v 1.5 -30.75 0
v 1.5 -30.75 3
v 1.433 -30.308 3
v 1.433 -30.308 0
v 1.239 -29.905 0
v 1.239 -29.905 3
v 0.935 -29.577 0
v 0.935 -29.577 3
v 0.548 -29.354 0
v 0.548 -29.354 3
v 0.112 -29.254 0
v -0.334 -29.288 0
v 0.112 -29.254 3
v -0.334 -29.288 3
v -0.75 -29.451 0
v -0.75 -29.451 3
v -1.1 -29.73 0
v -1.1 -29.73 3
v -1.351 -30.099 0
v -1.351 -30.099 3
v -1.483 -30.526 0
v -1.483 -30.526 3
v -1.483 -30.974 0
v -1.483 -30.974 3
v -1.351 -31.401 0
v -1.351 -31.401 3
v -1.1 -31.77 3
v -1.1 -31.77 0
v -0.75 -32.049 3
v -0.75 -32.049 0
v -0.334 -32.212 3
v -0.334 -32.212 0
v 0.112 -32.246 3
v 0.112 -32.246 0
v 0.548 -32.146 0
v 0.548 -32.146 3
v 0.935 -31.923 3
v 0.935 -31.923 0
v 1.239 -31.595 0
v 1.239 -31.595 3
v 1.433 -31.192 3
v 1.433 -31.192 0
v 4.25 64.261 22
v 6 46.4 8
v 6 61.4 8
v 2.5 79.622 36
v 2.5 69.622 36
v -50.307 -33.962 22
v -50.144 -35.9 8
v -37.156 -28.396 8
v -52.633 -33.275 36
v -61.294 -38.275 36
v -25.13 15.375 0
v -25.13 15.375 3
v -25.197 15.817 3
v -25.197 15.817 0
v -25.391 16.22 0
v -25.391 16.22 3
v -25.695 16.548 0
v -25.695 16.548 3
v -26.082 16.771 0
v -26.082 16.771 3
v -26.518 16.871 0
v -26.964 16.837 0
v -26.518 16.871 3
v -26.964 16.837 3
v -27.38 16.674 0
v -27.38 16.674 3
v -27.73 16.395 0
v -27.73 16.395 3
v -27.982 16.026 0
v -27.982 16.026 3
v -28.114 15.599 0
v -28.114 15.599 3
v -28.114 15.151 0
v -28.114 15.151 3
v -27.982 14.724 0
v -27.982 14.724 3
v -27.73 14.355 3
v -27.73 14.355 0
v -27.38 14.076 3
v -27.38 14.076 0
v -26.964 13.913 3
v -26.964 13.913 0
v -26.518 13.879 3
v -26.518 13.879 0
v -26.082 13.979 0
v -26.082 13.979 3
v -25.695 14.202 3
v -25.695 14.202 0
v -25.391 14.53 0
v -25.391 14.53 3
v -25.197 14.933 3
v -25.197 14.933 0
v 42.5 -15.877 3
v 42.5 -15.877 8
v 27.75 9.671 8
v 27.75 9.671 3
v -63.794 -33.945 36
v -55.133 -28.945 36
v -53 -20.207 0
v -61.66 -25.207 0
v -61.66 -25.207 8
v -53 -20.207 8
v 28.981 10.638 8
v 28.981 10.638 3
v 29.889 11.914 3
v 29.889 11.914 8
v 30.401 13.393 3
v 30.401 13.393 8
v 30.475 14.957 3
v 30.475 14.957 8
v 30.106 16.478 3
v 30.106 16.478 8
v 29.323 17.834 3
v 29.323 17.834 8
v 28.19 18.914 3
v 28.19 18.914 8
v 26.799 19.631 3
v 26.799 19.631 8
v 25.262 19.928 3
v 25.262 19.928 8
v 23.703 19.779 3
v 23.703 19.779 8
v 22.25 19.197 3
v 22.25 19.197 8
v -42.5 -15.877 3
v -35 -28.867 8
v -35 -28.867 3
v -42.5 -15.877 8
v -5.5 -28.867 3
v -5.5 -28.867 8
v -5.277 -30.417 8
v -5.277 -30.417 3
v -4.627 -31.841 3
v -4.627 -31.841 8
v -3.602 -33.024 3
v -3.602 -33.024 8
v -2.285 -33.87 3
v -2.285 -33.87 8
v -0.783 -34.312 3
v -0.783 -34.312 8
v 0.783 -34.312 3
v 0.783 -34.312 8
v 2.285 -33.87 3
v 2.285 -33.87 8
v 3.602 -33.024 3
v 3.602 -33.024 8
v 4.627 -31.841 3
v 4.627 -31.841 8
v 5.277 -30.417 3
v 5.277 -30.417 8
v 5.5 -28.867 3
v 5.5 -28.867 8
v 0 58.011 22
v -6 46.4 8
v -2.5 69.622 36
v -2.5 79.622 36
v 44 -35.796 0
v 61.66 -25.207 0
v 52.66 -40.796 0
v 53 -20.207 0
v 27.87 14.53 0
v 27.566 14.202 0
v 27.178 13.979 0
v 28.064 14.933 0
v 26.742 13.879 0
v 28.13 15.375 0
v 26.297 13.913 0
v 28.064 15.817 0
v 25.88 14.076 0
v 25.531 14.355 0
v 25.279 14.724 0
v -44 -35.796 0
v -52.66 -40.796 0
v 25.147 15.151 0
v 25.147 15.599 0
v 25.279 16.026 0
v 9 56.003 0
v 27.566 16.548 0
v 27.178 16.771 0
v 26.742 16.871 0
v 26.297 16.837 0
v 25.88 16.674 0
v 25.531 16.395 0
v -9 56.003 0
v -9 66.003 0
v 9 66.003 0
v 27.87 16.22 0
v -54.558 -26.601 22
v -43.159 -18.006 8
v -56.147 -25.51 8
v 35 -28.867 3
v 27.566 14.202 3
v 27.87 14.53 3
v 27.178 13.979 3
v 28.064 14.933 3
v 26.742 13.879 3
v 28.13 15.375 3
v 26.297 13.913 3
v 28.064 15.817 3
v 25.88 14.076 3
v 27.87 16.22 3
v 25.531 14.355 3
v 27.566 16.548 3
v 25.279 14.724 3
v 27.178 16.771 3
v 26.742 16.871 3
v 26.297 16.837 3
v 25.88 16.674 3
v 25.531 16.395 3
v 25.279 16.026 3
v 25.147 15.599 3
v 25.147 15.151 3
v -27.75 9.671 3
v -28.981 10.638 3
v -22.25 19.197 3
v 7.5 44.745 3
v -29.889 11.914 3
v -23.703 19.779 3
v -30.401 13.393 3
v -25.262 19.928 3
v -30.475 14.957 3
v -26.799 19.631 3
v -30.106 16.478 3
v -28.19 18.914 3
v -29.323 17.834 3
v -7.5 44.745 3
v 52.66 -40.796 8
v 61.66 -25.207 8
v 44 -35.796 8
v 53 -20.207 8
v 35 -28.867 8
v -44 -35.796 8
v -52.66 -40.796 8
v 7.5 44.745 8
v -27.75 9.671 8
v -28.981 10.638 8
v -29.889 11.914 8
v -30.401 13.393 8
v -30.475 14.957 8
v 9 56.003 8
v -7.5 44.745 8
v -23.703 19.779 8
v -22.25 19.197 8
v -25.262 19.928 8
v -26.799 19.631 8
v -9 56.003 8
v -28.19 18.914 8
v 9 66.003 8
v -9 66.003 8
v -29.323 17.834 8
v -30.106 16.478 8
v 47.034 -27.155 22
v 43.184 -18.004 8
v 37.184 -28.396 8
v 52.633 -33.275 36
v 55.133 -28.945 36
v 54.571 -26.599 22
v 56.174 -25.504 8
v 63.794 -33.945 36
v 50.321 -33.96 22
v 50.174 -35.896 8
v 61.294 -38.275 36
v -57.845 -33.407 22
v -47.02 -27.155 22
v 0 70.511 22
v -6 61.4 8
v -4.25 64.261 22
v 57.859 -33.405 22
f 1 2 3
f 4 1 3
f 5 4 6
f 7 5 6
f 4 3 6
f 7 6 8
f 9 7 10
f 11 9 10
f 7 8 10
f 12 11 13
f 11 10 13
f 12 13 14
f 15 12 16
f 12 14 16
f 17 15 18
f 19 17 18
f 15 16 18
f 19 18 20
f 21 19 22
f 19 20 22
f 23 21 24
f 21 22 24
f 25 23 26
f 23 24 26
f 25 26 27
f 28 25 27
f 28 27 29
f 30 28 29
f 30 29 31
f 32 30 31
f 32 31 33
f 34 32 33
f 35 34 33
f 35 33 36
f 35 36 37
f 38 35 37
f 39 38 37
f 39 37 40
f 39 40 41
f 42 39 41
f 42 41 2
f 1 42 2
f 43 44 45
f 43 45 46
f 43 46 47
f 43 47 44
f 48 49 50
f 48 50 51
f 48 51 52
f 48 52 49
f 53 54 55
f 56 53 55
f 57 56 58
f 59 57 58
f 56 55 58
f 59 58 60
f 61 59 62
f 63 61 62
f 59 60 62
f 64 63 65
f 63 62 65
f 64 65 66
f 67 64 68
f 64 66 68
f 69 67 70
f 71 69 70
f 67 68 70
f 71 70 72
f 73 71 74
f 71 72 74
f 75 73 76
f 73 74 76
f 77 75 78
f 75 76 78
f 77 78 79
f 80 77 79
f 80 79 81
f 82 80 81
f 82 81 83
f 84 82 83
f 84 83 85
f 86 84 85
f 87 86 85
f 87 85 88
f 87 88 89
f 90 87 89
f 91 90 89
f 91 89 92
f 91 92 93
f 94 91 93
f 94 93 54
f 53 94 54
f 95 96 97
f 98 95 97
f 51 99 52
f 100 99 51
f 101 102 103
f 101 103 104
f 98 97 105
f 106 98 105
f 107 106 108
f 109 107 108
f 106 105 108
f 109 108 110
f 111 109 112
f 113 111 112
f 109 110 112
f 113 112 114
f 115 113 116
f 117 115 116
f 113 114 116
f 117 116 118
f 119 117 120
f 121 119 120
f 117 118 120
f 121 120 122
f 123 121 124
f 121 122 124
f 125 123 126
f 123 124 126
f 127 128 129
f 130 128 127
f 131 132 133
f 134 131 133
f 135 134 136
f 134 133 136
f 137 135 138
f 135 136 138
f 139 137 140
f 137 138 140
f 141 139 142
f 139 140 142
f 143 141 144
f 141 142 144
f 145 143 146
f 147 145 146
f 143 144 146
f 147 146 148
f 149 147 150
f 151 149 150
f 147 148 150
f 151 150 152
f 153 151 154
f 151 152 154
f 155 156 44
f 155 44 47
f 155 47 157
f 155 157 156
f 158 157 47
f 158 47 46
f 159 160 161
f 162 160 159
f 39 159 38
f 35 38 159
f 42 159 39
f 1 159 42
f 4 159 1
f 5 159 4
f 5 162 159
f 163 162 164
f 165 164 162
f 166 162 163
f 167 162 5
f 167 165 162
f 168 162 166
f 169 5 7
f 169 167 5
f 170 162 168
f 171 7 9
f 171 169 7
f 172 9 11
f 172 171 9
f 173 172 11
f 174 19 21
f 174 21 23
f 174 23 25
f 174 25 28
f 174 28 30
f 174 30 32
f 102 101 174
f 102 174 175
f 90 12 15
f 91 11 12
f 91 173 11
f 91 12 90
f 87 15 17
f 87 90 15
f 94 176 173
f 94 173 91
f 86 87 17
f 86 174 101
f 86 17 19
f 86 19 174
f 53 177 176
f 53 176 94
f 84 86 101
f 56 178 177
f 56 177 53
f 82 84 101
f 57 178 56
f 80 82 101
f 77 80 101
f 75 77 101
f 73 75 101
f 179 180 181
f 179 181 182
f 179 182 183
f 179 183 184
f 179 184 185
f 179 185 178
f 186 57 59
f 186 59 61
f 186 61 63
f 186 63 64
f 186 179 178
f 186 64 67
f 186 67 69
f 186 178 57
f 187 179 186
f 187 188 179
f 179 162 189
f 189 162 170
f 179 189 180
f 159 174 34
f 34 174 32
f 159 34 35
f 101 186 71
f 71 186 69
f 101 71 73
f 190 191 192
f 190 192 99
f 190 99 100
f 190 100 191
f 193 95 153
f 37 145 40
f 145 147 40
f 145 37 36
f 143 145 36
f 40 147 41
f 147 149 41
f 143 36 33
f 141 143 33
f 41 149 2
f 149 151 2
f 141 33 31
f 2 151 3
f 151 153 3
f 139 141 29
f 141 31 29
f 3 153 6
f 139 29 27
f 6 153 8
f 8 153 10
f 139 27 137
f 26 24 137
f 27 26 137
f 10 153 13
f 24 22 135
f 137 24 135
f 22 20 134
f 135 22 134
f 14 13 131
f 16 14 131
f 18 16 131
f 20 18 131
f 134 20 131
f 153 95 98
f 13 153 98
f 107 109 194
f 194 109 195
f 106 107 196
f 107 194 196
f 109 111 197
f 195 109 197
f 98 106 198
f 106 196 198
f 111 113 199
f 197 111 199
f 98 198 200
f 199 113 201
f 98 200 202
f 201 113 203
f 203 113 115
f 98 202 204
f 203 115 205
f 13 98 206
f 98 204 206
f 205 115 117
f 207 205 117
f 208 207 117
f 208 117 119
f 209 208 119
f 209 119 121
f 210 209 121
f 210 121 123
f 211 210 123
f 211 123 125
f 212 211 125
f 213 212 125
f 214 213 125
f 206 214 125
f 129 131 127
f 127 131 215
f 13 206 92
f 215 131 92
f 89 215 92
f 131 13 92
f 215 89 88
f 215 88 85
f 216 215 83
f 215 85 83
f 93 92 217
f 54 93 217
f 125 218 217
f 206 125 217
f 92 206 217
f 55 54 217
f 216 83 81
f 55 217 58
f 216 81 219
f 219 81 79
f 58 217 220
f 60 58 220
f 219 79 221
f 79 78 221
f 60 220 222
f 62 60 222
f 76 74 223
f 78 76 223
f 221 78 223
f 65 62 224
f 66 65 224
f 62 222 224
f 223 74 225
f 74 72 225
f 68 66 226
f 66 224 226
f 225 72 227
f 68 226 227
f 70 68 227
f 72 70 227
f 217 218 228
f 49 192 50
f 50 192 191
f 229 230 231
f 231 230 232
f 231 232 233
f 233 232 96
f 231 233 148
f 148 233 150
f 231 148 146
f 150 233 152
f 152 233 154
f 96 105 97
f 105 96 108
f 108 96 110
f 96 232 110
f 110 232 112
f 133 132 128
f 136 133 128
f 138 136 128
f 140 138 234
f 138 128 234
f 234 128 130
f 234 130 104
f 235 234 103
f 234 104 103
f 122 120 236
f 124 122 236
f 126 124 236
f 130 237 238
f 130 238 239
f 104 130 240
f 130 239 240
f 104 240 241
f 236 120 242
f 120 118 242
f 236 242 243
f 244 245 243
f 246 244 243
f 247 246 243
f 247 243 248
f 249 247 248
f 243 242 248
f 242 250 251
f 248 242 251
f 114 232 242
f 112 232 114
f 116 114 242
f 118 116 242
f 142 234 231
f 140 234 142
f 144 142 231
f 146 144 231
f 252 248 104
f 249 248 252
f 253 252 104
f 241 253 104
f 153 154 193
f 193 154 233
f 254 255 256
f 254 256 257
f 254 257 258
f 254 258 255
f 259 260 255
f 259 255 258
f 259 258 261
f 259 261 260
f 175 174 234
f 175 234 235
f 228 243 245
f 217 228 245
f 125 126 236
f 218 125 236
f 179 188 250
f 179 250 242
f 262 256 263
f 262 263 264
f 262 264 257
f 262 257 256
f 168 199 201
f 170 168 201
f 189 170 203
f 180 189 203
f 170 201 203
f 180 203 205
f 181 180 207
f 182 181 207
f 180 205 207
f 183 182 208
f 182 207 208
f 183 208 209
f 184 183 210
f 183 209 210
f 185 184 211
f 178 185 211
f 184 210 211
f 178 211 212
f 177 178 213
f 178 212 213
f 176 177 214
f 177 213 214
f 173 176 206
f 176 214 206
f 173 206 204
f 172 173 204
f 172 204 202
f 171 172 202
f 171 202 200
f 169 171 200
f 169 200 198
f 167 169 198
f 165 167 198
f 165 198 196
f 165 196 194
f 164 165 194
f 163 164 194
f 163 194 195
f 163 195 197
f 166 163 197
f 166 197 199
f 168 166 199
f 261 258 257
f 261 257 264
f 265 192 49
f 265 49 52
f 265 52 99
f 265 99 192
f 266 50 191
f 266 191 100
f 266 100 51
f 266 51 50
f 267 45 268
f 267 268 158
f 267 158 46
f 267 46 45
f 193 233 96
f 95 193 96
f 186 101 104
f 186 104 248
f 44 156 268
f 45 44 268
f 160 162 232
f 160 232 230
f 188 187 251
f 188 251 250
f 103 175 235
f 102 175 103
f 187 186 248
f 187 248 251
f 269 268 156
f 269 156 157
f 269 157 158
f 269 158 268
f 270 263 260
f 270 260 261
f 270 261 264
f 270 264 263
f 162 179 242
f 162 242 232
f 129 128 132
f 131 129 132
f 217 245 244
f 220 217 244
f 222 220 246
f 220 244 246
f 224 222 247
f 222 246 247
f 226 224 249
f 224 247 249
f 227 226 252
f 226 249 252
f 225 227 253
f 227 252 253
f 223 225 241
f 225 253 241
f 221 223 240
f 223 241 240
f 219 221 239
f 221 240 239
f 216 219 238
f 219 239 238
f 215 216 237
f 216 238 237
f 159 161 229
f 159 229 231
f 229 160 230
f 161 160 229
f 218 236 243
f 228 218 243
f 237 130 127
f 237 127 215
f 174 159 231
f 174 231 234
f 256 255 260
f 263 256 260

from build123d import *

# Parameters (mm, degrees)
PAD_DEPTH       = 8
POCKET_DEPTH    = 5
SKETCH003_R     = 1.5
POCKET001_DEPTH = 3.001
SKETCH006_W     = 12
SKETCH006_H     = 15
SKETCH007_W     = 5
SKETCH007_H     = 10


with BuildPart() as pocket001:
    # Sketch → Pad (new body)
    with BuildSketch(Plane.XY):
        Polygon((8.999978, 56.00299), (52.999969, -20.20725), (61.660224, -25.207249), (52.660225, -40.795708), (43.999971, -35.795709), (-44.000029, -35.795709), (-52.660285, -40.795705), (-61.660279, -25.207244), (-53.000025, -20.207243), (-9.000022, 56.00299), (-9.000022, 66.00299), (8.999978, 66.00299), align=None)
    extrude(amount=PAD_DEPTH)

    # Sketch001 → Pocket (cut)
    with BuildSketch(Plane.XY.offset(8)):
        with BuildLine():
            Line((-34.999983, -28.867498), (-42.499982, -15.877117))
            Line((-42.499982, -15.877117), (-27.749984, 9.670634))
            ThreePointArc((-22.249985, 19.196914), (-29.763132, 17.183778), (-27.749984, 9.670634))
            Line((-7.499988, 44.744665), (-22.249985, 19.196914))
            Line((7.500012, 44.744665), (-7.499988, 44.744665))
            Line((22.250011, 19.196915), (7.500012, 44.744665))
            ThreePointArc((27.750011, 9.670636), (29.763152, 17.183776), (22.250011, 19.196915))
            Line((42.500011, -15.877114), (27.750011, 9.670636))
            Line((35.000017, -28.867498), (42.500011, -15.877114))
            Line((5.500017, -28.867498), (35.000017, -28.867498))
            ThreePointArc((-5.499983, -28.867498), (1.7e-05, -34.367519), (5.500017, -28.867498))
            Line((-34.999983, -28.867498), (-5.499983, -28.867498))
        make_face()
    extrude(amount=-POCKET_DEPTH, mode=Mode.SUBTRACT)

    # Sketch003 → Pocket001 (cut, through all)
    with BuildSketch(Plane.XY.offset(3)):
        with Locations((-26.630288, 15.374988)):
            Circle(SKETCH003_R)
        with Locations((0, -30.75)):
            Circle(SKETCH003_R)
        with Locations((26.630288, 15.374988)):
            Circle(SKETCH003_R)
    extrude(amount=-POCKET001_DEPTH, mode=Mode.SUBTRACT)


with BuildPart() as loft001:
    # Sketch006 → Loft001 section 0
    with BuildSketch(Plane.XY.offset(8)):
        with Locations((0, 53.9)):
            Rectangle(SKETCH006_W, SKETCH006_H)
    # Sketch007 → Loft001 section 1
    with BuildSketch(Plane.XY.offset(36)):
        with Locations((0, 74.622368)):
            Rectangle(SKETCH007_W, SKETCH007_H)
    loft()


with BuildPart() as loft_body:
    # Sketch004 → Loft section 0
    with BuildSketch(Plane.XY.offset(8)):
        Polygon((43.183629, -18.003853), (37.183634, -28.39616), (50.174019, -35.896155), (56.174014, -25.503847), align=None)
    # Sketch009 → Loft section 1
    with BuildSketch(Plane.XY.offset(36)):
        Polygon((55.133421, -28.944512), (52.633423, -33.27464), (61.293679, -38.274636), (63.793677, -33.944508), align=None)
    loft()


with BuildPart() as loft002:
    # Sketch008 → Loft002 section 0
    with BuildSketch(Plane.XY.offset(8)):
        Polygon((-56.146959, -25.509861), (-50.143792, -35.900337), (-37.155697, -28.396378), (-43.158864, -18.005902), align=None)
    # Sketch005 → Loft002 section 1
    with BuildSketch(Plane.XY.offset(36)):
        Polygon((-63.793697, -33.944575), (-61.293696, -38.274702), (-52.633443, -33.2747), (-55.133444, -28.944573), align=None)
    loft()


solid = Compound([pocket001.part, loft001.part, loft_body.part, loft002.part])
